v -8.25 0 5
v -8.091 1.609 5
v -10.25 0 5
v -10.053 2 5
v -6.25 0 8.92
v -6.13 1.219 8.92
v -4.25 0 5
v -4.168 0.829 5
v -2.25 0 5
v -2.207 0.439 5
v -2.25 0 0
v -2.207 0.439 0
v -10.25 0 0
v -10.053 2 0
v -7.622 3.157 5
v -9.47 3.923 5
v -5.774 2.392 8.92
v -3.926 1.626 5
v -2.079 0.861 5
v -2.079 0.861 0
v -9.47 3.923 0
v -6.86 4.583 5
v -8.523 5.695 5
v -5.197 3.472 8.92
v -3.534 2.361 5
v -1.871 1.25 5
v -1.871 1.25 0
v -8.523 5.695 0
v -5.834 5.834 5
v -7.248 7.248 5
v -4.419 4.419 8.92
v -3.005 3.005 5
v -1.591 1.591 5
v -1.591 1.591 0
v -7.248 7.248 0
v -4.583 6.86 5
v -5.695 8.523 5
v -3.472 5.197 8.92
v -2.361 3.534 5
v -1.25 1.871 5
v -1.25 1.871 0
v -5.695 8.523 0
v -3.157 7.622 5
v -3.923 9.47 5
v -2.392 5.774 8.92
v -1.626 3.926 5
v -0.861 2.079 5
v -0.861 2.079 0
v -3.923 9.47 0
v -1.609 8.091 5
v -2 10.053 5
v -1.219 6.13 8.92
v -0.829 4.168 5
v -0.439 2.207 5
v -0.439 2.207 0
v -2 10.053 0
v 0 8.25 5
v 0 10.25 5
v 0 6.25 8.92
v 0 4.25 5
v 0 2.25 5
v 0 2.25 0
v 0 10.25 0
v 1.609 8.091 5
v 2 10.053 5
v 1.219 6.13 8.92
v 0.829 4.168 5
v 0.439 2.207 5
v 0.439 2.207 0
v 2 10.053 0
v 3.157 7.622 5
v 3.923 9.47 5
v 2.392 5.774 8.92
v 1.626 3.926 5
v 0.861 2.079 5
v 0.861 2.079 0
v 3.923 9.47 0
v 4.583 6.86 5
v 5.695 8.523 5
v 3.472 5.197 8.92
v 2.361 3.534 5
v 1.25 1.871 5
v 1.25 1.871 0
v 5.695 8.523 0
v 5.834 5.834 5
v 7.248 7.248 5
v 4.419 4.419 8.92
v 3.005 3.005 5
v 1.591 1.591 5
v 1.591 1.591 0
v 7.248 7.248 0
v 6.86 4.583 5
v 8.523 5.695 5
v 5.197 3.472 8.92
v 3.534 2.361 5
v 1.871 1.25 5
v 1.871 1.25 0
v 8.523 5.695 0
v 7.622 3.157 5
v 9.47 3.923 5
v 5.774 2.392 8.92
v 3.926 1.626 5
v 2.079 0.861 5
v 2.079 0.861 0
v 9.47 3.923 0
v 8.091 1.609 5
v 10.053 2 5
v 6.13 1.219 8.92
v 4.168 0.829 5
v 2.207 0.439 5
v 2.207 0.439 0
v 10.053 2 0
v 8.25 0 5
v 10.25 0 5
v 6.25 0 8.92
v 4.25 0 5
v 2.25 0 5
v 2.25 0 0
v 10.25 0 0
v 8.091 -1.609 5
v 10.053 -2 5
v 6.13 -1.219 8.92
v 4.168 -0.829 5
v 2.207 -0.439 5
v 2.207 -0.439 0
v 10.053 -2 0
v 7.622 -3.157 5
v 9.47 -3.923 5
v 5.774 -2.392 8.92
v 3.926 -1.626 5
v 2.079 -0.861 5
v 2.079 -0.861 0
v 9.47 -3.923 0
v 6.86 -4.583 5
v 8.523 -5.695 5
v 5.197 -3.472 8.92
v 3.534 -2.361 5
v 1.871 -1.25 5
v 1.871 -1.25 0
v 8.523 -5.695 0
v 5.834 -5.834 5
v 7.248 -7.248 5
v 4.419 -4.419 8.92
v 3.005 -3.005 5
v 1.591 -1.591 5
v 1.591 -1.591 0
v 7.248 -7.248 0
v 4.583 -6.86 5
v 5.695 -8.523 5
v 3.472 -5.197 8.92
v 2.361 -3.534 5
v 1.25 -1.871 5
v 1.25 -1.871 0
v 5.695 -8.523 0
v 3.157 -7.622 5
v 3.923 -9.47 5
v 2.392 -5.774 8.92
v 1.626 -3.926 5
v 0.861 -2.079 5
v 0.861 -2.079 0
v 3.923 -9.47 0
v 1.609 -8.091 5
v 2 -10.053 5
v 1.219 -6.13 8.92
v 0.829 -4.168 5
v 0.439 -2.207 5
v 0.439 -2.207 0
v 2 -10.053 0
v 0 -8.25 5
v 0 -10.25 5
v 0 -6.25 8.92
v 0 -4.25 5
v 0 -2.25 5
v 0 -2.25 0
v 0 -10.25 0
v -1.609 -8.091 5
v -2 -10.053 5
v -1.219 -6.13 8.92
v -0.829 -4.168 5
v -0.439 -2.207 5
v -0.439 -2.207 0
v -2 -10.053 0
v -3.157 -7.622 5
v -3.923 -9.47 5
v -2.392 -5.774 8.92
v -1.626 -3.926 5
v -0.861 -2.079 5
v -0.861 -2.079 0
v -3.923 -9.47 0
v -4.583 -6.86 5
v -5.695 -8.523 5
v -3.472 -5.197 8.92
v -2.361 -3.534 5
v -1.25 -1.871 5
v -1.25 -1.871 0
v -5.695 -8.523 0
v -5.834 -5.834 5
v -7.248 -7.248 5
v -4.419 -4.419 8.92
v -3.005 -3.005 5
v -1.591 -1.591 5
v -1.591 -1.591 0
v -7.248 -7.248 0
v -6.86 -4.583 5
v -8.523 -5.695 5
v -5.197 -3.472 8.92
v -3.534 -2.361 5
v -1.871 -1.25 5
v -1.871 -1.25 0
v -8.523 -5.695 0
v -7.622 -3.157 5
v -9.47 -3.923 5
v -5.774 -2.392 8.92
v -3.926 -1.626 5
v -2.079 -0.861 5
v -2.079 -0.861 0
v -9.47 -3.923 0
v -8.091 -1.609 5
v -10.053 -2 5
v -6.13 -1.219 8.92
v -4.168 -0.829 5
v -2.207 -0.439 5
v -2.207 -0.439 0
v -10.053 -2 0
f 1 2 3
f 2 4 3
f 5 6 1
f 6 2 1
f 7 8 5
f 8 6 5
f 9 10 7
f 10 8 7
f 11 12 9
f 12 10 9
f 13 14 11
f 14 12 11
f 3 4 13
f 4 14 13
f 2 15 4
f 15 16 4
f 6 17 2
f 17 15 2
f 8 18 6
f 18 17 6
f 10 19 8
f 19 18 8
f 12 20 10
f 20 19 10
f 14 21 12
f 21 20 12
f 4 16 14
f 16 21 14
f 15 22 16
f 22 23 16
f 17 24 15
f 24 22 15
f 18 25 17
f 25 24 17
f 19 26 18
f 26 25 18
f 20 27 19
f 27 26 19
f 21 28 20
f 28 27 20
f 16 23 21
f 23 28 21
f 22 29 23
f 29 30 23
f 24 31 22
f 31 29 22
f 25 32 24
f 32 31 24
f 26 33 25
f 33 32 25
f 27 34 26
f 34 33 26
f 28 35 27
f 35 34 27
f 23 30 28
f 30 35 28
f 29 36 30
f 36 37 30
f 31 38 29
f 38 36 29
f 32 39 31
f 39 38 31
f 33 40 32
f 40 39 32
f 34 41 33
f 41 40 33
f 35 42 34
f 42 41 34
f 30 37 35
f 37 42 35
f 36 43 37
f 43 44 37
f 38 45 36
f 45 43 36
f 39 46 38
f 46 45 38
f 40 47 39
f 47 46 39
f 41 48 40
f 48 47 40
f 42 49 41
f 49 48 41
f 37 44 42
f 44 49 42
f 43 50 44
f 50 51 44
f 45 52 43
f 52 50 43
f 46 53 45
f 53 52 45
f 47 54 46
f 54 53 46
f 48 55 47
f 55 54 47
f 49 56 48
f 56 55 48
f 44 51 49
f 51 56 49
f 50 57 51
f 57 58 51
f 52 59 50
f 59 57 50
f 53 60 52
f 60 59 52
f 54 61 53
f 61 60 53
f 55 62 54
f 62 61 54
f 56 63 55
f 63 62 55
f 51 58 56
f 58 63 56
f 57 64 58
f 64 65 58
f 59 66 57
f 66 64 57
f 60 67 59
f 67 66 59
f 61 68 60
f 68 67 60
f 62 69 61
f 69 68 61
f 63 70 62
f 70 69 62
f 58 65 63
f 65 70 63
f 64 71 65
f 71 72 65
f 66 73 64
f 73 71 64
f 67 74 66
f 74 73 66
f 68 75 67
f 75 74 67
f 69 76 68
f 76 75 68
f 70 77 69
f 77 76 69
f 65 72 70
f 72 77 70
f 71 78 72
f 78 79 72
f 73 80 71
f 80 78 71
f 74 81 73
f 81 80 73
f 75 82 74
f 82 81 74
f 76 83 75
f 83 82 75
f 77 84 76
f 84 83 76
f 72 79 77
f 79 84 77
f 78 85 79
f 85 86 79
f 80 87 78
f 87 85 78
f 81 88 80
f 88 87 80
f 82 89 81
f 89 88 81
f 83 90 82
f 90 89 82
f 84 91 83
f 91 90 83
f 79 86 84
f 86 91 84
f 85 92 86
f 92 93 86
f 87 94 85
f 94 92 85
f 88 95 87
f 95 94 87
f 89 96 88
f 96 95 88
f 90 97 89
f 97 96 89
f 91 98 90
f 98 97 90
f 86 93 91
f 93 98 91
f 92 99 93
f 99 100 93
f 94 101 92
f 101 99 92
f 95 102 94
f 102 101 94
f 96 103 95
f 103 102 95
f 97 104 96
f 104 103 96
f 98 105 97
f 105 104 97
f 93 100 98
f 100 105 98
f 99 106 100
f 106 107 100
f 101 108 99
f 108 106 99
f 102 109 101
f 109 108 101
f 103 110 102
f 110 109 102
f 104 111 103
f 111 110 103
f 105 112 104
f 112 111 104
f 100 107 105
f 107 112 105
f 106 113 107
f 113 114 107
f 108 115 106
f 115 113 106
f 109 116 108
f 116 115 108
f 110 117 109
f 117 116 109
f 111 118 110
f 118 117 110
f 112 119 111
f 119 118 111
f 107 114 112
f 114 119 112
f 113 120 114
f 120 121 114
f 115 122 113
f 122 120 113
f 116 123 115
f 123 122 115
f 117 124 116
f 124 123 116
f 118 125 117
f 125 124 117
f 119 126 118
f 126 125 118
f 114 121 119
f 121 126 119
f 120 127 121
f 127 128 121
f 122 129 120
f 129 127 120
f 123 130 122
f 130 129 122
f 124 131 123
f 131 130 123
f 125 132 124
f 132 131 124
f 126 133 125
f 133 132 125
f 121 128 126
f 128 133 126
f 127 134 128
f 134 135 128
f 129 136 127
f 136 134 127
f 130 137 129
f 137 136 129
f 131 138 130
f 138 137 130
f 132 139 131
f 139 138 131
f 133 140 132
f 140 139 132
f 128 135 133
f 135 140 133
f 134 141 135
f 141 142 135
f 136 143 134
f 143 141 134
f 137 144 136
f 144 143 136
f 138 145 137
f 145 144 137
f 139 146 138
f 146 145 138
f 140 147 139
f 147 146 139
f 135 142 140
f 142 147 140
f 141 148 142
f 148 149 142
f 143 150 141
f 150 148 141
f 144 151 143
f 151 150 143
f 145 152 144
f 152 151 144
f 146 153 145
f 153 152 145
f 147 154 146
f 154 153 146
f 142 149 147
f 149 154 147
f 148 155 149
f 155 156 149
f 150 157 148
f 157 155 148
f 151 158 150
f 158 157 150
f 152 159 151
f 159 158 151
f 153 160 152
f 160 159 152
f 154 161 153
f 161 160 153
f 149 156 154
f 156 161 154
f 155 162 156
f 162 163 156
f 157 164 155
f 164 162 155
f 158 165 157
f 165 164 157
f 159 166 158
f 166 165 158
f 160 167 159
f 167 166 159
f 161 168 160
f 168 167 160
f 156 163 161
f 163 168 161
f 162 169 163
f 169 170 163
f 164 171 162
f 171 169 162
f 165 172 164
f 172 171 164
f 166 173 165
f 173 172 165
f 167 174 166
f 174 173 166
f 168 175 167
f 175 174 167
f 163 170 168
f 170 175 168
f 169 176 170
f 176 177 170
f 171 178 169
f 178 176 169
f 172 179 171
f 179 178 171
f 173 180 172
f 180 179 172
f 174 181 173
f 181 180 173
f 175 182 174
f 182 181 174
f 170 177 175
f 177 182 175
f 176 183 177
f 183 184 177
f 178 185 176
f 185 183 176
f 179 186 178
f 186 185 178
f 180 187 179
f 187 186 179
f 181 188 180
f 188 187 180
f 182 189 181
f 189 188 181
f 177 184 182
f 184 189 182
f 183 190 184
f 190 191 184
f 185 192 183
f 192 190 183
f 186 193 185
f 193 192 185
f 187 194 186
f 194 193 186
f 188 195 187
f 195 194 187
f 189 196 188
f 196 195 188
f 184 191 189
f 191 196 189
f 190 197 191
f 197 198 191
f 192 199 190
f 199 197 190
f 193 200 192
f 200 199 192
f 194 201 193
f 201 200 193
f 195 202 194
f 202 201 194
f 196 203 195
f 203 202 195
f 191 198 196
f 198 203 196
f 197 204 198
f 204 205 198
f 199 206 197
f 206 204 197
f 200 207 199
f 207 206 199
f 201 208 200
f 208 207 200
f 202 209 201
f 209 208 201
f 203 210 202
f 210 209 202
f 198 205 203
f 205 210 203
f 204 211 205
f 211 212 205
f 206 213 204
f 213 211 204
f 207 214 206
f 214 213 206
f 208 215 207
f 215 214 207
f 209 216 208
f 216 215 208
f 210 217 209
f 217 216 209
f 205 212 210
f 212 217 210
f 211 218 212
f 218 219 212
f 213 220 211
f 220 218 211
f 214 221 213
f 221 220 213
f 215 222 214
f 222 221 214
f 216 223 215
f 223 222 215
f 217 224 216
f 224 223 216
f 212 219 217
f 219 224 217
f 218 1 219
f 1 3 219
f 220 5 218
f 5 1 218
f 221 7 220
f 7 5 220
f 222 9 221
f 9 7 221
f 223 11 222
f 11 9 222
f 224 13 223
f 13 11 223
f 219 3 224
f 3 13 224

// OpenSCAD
$fn = 32;

// ----------------------------------------------------------------------
// Form washer: domed washer, 20.5 mm outside, 4.5 mm bore
// ----------------------------------------------------------------------

// --- parameters (mm) ---
revolve_angle = 360;      // full turn around the Z axis
profile_points = 7;       // points of the closed outline

profile = [[2.25, 0], [10.25, 0], [10.25, 5], [8.25, 5], [6.25, 8.92], [4.25, 5], [2.25, 5]];  // single closed polygon, 7 points, counter clockwise

// --- the one profile operation ---
rotate_extrude(angle = revolve_angle) polygon(points = profile);
